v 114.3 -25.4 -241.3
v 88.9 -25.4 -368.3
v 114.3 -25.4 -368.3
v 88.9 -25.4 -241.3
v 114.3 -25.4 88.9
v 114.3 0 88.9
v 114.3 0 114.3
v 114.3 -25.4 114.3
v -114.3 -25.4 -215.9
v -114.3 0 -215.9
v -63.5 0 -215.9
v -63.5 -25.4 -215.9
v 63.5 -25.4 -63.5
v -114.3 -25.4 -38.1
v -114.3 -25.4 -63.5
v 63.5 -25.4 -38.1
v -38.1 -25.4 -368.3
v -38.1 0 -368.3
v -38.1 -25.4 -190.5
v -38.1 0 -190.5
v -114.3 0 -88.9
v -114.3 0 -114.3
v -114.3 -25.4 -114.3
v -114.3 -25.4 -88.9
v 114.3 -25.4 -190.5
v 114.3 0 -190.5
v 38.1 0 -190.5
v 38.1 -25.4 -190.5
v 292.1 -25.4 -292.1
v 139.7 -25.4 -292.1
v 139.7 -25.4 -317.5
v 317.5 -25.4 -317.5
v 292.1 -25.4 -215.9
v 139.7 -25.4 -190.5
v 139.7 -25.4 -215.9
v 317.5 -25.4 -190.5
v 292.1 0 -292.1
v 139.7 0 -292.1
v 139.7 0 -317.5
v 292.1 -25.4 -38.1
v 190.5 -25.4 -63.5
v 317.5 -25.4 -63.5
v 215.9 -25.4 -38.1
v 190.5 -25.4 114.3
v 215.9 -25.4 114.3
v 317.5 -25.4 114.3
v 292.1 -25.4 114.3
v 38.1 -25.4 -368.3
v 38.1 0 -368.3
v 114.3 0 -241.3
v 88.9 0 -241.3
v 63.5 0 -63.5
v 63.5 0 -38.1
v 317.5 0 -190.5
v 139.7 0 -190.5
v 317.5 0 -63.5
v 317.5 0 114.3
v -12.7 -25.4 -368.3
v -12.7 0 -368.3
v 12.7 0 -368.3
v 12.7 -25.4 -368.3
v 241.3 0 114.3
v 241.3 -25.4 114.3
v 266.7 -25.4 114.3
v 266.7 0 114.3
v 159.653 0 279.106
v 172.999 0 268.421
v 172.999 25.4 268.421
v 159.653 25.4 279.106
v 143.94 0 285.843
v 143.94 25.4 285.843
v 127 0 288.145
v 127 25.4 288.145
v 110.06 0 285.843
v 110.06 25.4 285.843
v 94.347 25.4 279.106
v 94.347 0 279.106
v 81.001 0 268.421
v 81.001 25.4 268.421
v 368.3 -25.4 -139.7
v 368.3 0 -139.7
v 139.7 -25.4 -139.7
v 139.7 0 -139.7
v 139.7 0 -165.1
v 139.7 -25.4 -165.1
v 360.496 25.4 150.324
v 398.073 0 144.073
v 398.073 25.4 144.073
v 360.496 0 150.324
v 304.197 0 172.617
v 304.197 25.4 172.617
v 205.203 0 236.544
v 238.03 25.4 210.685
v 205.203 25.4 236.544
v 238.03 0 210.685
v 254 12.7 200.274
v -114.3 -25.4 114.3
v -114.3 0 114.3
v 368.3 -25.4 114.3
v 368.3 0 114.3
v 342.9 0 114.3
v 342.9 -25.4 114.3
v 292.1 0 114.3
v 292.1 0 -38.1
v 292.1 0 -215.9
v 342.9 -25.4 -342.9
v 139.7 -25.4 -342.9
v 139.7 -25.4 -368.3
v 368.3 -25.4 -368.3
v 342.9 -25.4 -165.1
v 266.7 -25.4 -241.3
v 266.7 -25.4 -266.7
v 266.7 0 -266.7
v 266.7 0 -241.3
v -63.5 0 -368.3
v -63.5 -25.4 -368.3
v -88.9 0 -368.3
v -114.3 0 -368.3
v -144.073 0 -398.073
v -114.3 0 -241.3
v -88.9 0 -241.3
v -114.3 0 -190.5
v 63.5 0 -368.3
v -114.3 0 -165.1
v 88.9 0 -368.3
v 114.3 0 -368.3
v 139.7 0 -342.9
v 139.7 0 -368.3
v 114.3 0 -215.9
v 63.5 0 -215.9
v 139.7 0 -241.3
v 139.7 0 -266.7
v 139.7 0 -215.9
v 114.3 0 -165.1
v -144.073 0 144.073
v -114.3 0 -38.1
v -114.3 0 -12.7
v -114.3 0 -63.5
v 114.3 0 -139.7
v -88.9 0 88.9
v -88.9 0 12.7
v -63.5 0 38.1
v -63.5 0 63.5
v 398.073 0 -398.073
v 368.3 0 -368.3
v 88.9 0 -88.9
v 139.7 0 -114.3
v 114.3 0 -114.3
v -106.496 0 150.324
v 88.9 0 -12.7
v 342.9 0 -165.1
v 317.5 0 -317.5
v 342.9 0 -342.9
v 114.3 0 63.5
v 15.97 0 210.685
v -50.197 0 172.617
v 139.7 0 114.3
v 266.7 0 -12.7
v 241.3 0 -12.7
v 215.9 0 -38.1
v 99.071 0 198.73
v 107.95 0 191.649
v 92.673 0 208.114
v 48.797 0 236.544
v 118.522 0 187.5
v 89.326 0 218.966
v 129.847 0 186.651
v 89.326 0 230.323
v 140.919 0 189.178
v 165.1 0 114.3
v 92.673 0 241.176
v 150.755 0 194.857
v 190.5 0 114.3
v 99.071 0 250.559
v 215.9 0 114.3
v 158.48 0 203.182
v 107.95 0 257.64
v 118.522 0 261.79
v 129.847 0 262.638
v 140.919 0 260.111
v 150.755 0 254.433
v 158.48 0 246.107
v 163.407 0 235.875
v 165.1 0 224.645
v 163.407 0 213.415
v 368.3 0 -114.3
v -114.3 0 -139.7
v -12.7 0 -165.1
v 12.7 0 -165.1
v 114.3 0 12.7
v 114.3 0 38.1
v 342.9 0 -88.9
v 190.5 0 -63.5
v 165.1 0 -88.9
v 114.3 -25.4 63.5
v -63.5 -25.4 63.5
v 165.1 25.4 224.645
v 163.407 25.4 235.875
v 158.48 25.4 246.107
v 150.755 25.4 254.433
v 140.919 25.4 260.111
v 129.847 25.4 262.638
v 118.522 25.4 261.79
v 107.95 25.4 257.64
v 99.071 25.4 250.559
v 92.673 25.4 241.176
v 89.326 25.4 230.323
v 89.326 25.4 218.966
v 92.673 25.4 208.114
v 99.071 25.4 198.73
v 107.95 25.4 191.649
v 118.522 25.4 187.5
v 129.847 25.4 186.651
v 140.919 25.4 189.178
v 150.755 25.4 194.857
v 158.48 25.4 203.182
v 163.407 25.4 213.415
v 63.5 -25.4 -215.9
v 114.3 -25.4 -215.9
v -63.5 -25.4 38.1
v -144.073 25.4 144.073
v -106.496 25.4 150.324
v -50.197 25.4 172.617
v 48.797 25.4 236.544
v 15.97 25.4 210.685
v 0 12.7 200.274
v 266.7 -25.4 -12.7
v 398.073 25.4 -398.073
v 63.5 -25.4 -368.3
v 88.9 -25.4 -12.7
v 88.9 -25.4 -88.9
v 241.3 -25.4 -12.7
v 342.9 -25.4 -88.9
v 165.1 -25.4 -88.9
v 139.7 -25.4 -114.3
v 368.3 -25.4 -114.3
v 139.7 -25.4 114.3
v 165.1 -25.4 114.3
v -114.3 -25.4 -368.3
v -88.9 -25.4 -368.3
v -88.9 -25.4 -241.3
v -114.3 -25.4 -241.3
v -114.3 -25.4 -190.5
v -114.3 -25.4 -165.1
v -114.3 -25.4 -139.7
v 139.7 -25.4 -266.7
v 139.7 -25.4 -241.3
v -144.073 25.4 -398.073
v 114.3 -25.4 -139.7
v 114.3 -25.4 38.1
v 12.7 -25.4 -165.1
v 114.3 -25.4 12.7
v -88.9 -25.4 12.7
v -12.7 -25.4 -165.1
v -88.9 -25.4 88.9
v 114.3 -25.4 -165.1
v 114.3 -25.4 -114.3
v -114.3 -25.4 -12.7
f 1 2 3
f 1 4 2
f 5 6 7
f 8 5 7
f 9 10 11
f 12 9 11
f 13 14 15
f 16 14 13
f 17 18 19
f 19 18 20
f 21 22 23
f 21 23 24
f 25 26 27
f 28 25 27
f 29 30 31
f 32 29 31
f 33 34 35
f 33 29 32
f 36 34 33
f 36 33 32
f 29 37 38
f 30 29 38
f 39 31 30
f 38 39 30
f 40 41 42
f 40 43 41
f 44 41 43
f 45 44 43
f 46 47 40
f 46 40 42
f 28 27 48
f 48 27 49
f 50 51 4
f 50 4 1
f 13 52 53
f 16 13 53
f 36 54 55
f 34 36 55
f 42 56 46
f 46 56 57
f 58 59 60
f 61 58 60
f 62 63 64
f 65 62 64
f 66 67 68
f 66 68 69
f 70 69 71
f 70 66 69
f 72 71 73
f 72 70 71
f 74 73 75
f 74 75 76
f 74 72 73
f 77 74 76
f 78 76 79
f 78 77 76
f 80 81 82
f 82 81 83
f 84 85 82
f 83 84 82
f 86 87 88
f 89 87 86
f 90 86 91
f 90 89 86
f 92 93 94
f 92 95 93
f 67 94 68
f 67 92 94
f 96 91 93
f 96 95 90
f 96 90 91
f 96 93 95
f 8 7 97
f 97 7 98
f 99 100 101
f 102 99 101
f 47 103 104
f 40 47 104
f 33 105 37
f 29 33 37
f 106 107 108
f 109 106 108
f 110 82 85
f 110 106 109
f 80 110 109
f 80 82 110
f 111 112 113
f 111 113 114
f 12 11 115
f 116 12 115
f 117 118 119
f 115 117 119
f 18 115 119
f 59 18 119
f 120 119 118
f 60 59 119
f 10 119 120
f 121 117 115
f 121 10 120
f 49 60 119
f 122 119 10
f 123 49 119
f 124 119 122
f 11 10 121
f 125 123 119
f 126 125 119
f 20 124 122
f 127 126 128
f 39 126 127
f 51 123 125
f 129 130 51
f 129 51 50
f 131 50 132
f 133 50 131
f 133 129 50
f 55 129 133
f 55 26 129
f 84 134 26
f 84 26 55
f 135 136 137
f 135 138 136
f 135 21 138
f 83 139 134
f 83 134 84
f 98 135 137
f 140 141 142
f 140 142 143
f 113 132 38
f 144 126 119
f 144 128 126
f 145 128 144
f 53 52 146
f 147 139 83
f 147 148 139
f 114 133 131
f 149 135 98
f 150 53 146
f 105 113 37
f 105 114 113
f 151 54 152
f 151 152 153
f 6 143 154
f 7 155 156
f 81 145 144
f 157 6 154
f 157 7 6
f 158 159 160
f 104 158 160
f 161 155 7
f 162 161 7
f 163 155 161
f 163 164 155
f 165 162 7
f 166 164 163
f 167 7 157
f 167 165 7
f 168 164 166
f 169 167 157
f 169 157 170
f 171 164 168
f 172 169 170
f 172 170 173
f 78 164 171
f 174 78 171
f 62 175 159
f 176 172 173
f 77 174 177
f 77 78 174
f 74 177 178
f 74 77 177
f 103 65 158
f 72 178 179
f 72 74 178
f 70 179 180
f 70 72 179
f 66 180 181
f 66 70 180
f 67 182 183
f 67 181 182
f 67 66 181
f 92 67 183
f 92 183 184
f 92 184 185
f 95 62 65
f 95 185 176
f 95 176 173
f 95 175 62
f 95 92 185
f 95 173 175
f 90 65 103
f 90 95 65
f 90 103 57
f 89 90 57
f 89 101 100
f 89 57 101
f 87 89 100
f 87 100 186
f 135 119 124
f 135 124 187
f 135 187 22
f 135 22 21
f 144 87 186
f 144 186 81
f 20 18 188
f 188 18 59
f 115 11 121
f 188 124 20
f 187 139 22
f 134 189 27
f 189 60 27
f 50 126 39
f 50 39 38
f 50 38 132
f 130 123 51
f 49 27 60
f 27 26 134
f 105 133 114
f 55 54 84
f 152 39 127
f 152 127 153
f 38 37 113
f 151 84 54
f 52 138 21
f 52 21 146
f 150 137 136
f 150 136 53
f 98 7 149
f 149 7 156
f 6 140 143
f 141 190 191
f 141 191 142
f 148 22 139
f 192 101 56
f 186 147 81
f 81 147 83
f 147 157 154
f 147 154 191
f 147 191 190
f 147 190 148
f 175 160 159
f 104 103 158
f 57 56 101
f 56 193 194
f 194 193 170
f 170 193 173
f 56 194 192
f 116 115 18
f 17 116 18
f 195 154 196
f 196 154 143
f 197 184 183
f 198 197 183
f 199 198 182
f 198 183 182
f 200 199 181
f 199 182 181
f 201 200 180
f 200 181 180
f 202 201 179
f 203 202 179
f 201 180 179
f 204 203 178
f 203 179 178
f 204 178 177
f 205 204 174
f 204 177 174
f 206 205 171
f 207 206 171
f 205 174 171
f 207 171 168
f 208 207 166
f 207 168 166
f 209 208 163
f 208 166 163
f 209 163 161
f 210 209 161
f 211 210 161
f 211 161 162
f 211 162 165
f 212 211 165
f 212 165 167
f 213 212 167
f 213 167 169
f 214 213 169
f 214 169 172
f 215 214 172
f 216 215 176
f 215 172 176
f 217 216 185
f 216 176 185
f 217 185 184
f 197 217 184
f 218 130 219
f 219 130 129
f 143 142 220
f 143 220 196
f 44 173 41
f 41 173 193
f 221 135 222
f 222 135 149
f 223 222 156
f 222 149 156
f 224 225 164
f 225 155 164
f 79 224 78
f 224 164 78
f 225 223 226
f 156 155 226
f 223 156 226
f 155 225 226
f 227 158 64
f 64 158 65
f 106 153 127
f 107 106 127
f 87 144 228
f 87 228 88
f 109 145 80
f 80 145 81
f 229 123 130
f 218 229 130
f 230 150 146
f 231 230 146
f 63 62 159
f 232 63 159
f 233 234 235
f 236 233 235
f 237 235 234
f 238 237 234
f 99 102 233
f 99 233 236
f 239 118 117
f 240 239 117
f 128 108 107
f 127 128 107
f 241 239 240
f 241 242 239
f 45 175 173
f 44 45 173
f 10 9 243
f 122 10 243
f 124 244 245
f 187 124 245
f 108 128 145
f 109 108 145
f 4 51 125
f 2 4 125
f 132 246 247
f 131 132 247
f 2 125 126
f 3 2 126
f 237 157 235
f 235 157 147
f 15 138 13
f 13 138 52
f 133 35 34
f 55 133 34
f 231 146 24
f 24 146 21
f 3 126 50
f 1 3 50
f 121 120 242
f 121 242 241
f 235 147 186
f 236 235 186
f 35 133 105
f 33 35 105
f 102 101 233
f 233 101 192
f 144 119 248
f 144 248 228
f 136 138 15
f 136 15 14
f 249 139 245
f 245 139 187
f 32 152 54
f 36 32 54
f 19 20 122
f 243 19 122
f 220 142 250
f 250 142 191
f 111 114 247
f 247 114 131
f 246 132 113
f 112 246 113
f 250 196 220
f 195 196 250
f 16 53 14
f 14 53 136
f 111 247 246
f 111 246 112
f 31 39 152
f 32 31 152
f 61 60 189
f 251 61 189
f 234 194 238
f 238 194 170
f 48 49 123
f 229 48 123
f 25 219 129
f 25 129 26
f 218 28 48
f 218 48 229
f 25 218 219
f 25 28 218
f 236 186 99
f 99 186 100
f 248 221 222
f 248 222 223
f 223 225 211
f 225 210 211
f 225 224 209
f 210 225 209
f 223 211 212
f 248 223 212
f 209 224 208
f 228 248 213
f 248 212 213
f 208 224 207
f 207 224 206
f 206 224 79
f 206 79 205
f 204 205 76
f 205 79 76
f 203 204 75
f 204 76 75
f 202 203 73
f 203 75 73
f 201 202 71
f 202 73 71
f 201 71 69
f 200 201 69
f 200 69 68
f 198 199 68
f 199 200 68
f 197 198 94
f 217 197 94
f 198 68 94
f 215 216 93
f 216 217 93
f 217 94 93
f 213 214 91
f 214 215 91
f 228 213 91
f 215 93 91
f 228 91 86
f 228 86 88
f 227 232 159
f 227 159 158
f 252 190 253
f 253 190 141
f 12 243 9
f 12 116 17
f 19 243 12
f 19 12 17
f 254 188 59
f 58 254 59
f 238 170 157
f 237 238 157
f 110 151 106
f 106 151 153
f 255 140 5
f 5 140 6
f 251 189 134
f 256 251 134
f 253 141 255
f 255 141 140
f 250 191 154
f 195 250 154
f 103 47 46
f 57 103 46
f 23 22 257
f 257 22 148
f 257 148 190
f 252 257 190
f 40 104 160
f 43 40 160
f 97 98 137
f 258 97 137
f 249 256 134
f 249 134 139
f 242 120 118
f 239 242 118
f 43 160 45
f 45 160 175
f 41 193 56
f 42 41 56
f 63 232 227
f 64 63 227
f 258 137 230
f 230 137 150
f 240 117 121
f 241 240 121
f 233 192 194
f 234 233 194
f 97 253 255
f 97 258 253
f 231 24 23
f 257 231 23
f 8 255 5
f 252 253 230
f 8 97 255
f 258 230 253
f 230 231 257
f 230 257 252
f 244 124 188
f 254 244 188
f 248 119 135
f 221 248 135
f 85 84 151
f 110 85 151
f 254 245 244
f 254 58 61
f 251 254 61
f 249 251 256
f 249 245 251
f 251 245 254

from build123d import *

# Parameters (mm, degrees)
F0_W     = 25.4
F0_H     = 25.4
F1_DEPTH = 25.4
F2_DEPTH = 25.4
F3_DEPTH = 25.4
F4_W     = 542.145707978
F4_H     = 542.145707978
F4_R     = 38.1
F5_DEPTH = 25.4


with BuildPart() as f1:
    # F0 (on Front) → F1 (new body)
    with BuildSketch(Plane.XZ):
        with Locations((101.6, 101.6)):
            Rectangle(F0_W, F0_H)
        with Locations((76.2, 101.6)):
            Rectangle(F0_W, F0_H)
        with Locations((50.8, 101.6)):
            Rectangle(F0_W, F0_H)
        with Locations((25.4, 101.6)):
            Rectangle(F0_W, F0_H)
        with Locations((0, 101.6)):
            Rectangle(F0_W, F0_H)
        with Locations((-25.4, 101.6)):
            Rectangle(F0_W, F0_H)
        with Locations((-50.8, 101.6)):
            Rectangle(F0_W, F0_H)
        with Locations((-76.2, 101.6)):
            Rectangle(F0_W, F0_H)
        with Locations((-101.6, 101.6)):
            Rectangle(F0_W, F0_H)
        with Locations((-101.6, 76.2)):
            Rectangle(F0_W, F0_H)
        with Locations((-101.6, 50.8)):
            Rectangle(F0_W, F0_H)
        with Locations((-101.6, 25.4)):
            Rectangle(F0_W, F0_H)
        with Locations((-101.6, 0)):
            Rectangle(F0_W, F0_H)
        with Locations((-76.2, 0)):
            Rectangle(F0_W, F0_H)
        with Locations((-50.8, 0)):
            Rectangle(F0_W, F0_H)
        with Locations((-25.4, 0)):
            Rectangle(F0_W, F0_H)
        Rectangle(F0_W, F0_H)
        with Locations((25.4, 0)):
            Rectangle(F0_W, F0_H)
        with Locations((50.8, 0)):
            Rectangle(F0_W, F0_H)
        with Locations((76.2, 0)):
            Rectangle(F0_W, F0_H)
        with Locations((101.6, 0)):
            Rectangle(F0_W, F0_H)
    extrude(amount=F1_DEPTH)

    # F0 (on Front) → F2, piece 4 (join)
    with BuildSketch(Plane.XZ):
        with Locations((101.6, -76.2)):
            Rectangle(F0_W, F0_H)
        with Locations((101.6, -25.4)):
            Rectangle(F0_W, F0_H)
        with Locations((101.6, -50.8)):
            Rectangle(F0_W, F0_H)
        with Locations((101.6, -101.6)):
            Rectangle(F0_W, F0_H)
        with Locations((25.4, -101.6)):
            Rectangle(F0_W, F0_H)
        with Locations((50.8, -101.6)):
            Rectangle(F0_W, F0_H)
        with Locations((76.2, -101.6)):
            Rectangle(F0_W, F0_H)
        with Locations((-76.2, -101.6)):
            Rectangle(F0_W, F0_H)
        with Locations((-50.8, -101.6)):
            Rectangle(F0_W, F0_H)
        with Locations((-25.4, -101.6)):
            Rectangle(F0_W, F0_H)
        with Locations((0, -101.6)):
            Rectangle(F0_W, F0_H)
        with Locations((-101.6, -101.6)):
            Rectangle(F0_W, F0_H)
    extrude(amount=F2_DEPTH)



with BuildPart() as f2:
    # F0 (on Front) → F2 (new body)
    with BuildSketch(Plane.XZ):
        Polygon((165.1, 88.9), (165.1, 114.3), (139.7, 114.3), (139.7, -114.3), (368.3, -114.3), (368.3, 114.3), (342.9, 114.3), (342.9, 88.9), (342.9, 63.5), (342.9, 38.1), (342.9, 12.7), (342.9, -12.7), (342.9, -38.1), (342.9, -63.5), (342.9, -88.9), (317.5, -88.9), (292.1, -88.9), (266.7, -88.9), (241.3, -88.9), (215.9, -88.9), (190.5, -88.9), (165.1, -88.9), (165.1, -63.5), (165.1, -38.1), (165.1, -12.7), (165.1, 12.7), (165.1, 38.1), (165.1, 63.5), align=None)
    extrude(amount=F2_DEPTH)


with BuildPart() as f2b:
    # F0 (on Front) → F2, piece 2 (new body)
    with BuildSketch(Plane.XZ):
        Polygon((215.9, 88.9), (215.9, 114.3), (190.5, 114.3), (190.5, 88.9), (190.5, 63.5), (215.9, 63.5), align=None)
        with Locations((203.2, 50.8)):
            Rectangle(F0_W, F0_H)
        with Locations((203.2, 25.4)):
            Rectangle(F0_W, F0_H)
        with Locations((203.2, 0)):
            Rectangle(F0_W, F0_H)
        with Locations((203.2, -25.4)):
            Rectangle(F0_W, F0_H)
        with Locations((203.2, -50.8)):
            Rectangle(F0_W, F0_H)
        with Locations((279.4, -50.8)):
            Rectangle(F0_W, F0_H)
        with Locations((304.8, -50.8)):
            Rectangle(F0_W, F0_H)
        with Locations((228.6, -50.8)):
            Rectangle(F0_W, F0_H)
        with Locations((254, -50.8)):
            Rectangle(F0_W, F0_H)
        with Locations((304.8, 76.2)):
            Rectangle(F0_W, F0_H)
        with Locations((304.8, 101.6)):
            Rectangle(F0_W, F0_H)
        with Locations((304.8, 25.4)):
            Rectangle(F0_W, F0_H)
        with Locations((304.8, 0)):
            Rectangle(F0_W, F0_H)
        with Locations((304.8, -25.4)):
            Rectangle(F0_W, F0_H)
        with Locations((304.8, 50.8)):
            Rectangle(F0_W, F0_H)
    extrude(amount=F2_DEPTH)


with BuildPart() as f2c:
    # F0 (on Front) → F2, piece 3 (new body)
    with BuildSketch(Plane.XZ):
        with Locations((254, 76.2)):
            Rectangle(F0_W, F0_H)
        with Locations((254, 25.4)):
            Rectangle(F0_W, F0_H)
        with Locations((254, 50.8)):
            Rectangle(F0_W, F0_H)
        with Locations((254, 0)):
            Rectangle(F0_W, F0_H)
        with Locations((254, 101.6)):
            Rectangle(F0_W, F0_H)
    extrude(amount=F2_DEPTH)


with BuildPart() as f2d:
    # F0 (on Front) → F2, piece 5 (new body)
    with BuildSketch(Plane.XZ):
        with Locations((-25.4, -50.8)):
            Rectangle(F0_W, F0_H)
        with Locations((-101.6, -50.8)):
            Rectangle(F0_W, F0_H)
        with Locations((-76.2, -50.8)):
            Rectangle(F0_W, F0_H)
        with Locations((50.8, -50.8)):
            Rectangle(F0_W, F0_H)
        with Locations((25.4, -50.8)):
            Rectangle(F0_W, F0_H)
        with Locations((-50.8, -50.8)):
            Rectangle(F0_W, F0_H)
        with Locations((0, -50.8)):
            Rectangle(F0_W, F0_H)
    extrude(amount=F2_DEPTH)


with BuildPart() as f2e:
    # F0 (on Front) → F2, piece 6 (new body)
    with BuildSketch(Plane.XZ):
        with Locations((-101.6, -152.4)):
            Rectangle(F0_W, F0_H)
        with Locations((101.6, -152.4)):
            Rectangle(F0_W, F0_H)
        with Locations((25.4, -152.4)):
            Rectangle(F0_W, F0_H)
        with Locations((50.8, -152.4)):
            Rectangle(F0_W, F0_H)
        with Locations((-25.4, -152.4)):
            Rectangle(F0_W, F0_H)
        with Locations((76.2, -152.4)):
            Rectangle(F0_W, F0_H)
        with Locations((0, -152.4)):
            Rectangle(F0_W, F0_H)
        with Locations((-76.2, -152.4)):
            Rectangle(F0_W, F0_H)
        with Locations((-50.8, -152.4)):
            Rectangle(F0_W, F0_H)
        with Locations((0, -355.6)):
            Rectangle(F0_W, F0_H)
        with Locations((0, -203.2)):
            Rectangle(F0_W, F0_H)
        with Locations((0, -228.6)):
            Rectangle(F0_W, F0_H)
        with Locations((0, -254)):
            Rectangle(F0_W, F0_H)
        with Locations((0, -279.4)):
            Rectangle(F0_W, F0_H)
        with Locations((0, -304.8)):
            Rectangle(F0_W, F0_H)
        with Locations((0, -177.8)):
            Rectangle(F0_W, F0_H)
        with Locations((0, -330.2)):
            Rectangle(F0_W, F0_H)
    extrude(amount=F2_DEPTH)


with BuildPart() as f2f:
    # F0 (on Front) → F2, piece 7 (new body)
    with BuildSketch(Plane.XZ):
        with Locations((76.2, -203.2)):
            Rectangle(F0_W, F0_H)
        with Locations((101.6, -203.2)):
            Rectangle(F0_W, F0_H)
        with Locations((50.8, -203.2)):
            Rectangle(F0_W, F0_H)
        with Locations((50.8, -228.6)):
            Rectangle(F0_W, F0_H)
        with Locations((50.8, -355.6)):
            Rectangle(F0_W, F0_H)
        with Locations((50.8, -254)):
            Rectangle(F0_W, F0_H)
        with Locations((50.8, -279.4)):
            Rectangle(F0_W, F0_H)
        with Locations((50.8, -304.8)):
            Rectangle(F0_W, F0_H)
        with Locations((50.8, -330.2)):
            Rectangle(F0_W, F0_H)
    extrude(amount=F2_DEPTH)


with BuildPart() as f2g:
    # F0 (on Front) → F2, piece 8 (new body)
    with BuildSketch(Plane.XZ):
        with Locations((101.6, -355.6)):
            Rectangle(F0_W, F0_H)
        with Locations((101.6, -254)):
            Rectangle(F0_W, F0_H)
        with Locations((101.6, -279.4)):
            Rectangle(F0_W, F0_H)
        with Locations((101.6, -304.8)):
            Rectangle(F0_W, F0_H)
        with Locations((101.6, -330.2)):
            Rectangle(F0_W, F0_H)
    extrude(amount=F2_DEPTH)


with BuildPart() as f2h:
    # F0 (on Front) → F2, piece 9 (new body)
    with BuildSketch(Plane.XZ):
        with Locations((-76.2, -203.2)):
            Rectangle(F0_W, F0_H)
        with Locations((-50.8, -203.2)):
            Rectangle(F0_W, F0_H)
        with Locations((-101.6, -203.2)):
            Rectangle(F0_W, F0_H)
        with Locations((-50.8, -228.6)):
            Rectangle(F0_W, F0_H)
        with Locations((-50.8, -254)):
            Rectangle(F0_W, F0_H)
        with Locations((-50.8, -279.4)):
            Rectangle(F0_W, F0_H)
        with Locations((-50.8, -304.8)):
            Rectangle(F0_W, F0_H)
        with Locations((-50.8, -330.2)):
            Rectangle(F0_W, F0_H)
        with Locations((-50.8, -355.6)):
            Rectangle(F0_W, F0_H)
    extrude(amount=F2_DEPTH)


with BuildPart() as f2i:
    # F0 (on Front) → F2, piece 10 (new body)
    with BuildSketch(Plane.XZ):
        with Locations((-101.6, -355.6)):
            Rectangle(F0_W, F0_H)
        with Locations((-101.6, -254)):
            Rectangle(F0_W, F0_H)
        with Locations((-101.6, -279.4)):
            Rectangle(F0_W, F0_H)
        with Locations((-101.6, -304.8)):
            Rectangle(F0_W, F0_H)
        with Locations((-101.6, -330.2)):
            Rectangle(F0_W, F0_H)
    extrude(amount=F2_DEPTH)


with BuildPart() as f2j:
    # F0 (on Front) → F2, piece 11 (new body)
    with BuildSketch(Plane.XZ):
        with Locations((152.4, -152.4)):
            Rectangle(F0_W, F0_H)
        with Locations((355.6, -152.4)):
            Rectangle(F0_W, F0_H)
        with Locations((203.2, -152.4)):
            Rectangle(F0_W, F0_H)
        with Locations((279.4, -152.4)):
            Rectangle(F0_W, F0_H)
        with Locations((304.8, -152.4)):
            Rectangle(F0_W, F0_H)
        with Locations((228.6, -152.4)):
            Rectangle(F0_W, F0_H)
        with Locations((254, -152.4)):
            Rectangle(F0_W, F0_H)
        with Locations((330.2, -152.4)):
            Rectangle(F0_W, F0_H)
        with Locations((177.8, -152.4)):
            Rectangle(F0_W, F0_H)
        with Locations((355.6, -355.6)):
            Rectangle(F0_W, F0_H)
        with Locations((355.6, -330.2)):
            Rectangle(F0_W, F0_H)
        with Locations((355.6, -203.2)):
            Rectangle(F0_W, F0_H)
        with Locations((355.6, -177.8)):
            Rectangle(F0_W, F0_H)
        with Locations((355.6, -228.6)):
            Rectangle(F0_W, F0_H)
        with Locations((355.6, -254)):
            Rectangle(F0_W, F0_H)
        with Locations((355.6, -279.4)):
            Rectangle(F0_W, F0_H)
        with Locations((355.6, -304.8)):
            Rectangle(F0_W, F0_H)
        with Locations((152.4, -355.6)):
            Rectangle(F0_W, F0_H)
        with Locations((177.8, -355.6)):
            Rectangle(F0_W, F0_H)
        with Locations((203.2, -355.6)):
            Rectangle(F0_W, F0_H)
        with Locations((254, -355.6)):
            Rectangle(F0_W, F0_H)
        with Locations((228.6, -355.6)):
            Rectangle(F0_W, F0_H)
        with Locations((279.4, -355.6)):
            Rectangle(F0_W, F0_H)
        with Locations((304.8, -355.6)):
            Rectangle(F0_W, F0_H)
        with Locations((330.2, -355.6)):
            Rectangle(F0_W, F0_H)
    extrude(amount=F2_DEPTH)


with BuildPart() as f2k:
    # F0 (on Front) → F2, piece 12 (new body)
    with BuildSketch(Plane.XZ):
        with Locations((304.8, -203.2)):
            Rectangle(F0_W, F0_H)
        with Locations((304.8, -228.6)):
            Rectangle(F0_W, F0_H)
        with Locations((304.8, -254)):
            Rectangle(F0_W, F0_H)
        with Locations((304.8, -279.4)):
            Rectangle(F0_W, F0_H)
        with Locations((304.8, -304.8)):
            Rectangle(F0_W, F0_H)
        with Locations((279.4, -203.2)):
            Rectangle(F0_W, F0_H)
        with Locations((177.8, -203.2)):
            Rectangle(F0_W, F0_H)
        with Locations((254, -203.2)):
            Rectangle(F0_W, F0_H)
        with Locations((228.6, -203.2)):
            Rectangle(F0_W, F0_H)
        with Locations((203.2, -203.2)):
            Rectangle(F0_W, F0_H)
        with Locations((152.4, -203.2)):
            Rectangle(F0_W, F0_H)
        with Locations((177.8, -304.8)):
            Rectangle(F0_W, F0_H)
        with Locations((279.4, -304.8)):
            Rectangle(F0_W, F0_H)
        with Locations((203.2, -304.8)):
            Rectangle(F0_W, F0_H)
        with Locations((228.6, -304.8)):
            Rectangle(F0_W, F0_H)
        with Locations((254, -304.8)):
            Rectangle(F0_W, F0_H)
        with Locations((152.4, -304.8)):
            Rectangle(F0_W, F0_H)
    extrude(amount=F2_DEPTH)


with BuildPart() as f2l:
    # F0 (on Front) → F2, piece 13 (new body)
    with BuildSketch(Plane.XZ):
        with Locations((177.8, -254)):
            Rectangle(F0_W, F0_H)
        with Locations((254, -254)):
            Rectangle(F0_W, F0_H)
        with Locations((228.6, -254)):
            Rectangle(F0_W, F0_H)
        with Locations((203.2, -254)):
            Rectangle(F0_W, F0_H)
        with Locations((152.4, -254)):
            Rectangle(F0_W, F0_H)
    extrude(amount=F2_DEPTH)


with BuildPart() as f3:
    # F0 (on Front) → F3 (new body)
    with BuildSketch(Plane.XZ):
        with Locations((101.6, 50.8)):
            Rectangle(F0_W, F0_H)
        with Locations((76.2, 50.8)):
            Rectangle(F0_W, F0_H)
        with Locations((50.8, 50.8)):
            Rectangle(F0_W, F0_H)
        with Locations((25.4, 50.8)):
            Rectangle(F0_W, F0_H)
        with Locations((0, 50.8)):
            Rectangle(F0_W, F0_H)
        with Locations((-25.4, 50.8)):
            Rectangle(F0_W, F0_H)
        with Locations((-50.8, 50.8)):
            Rectangle(F0_W, F0_H)
    extrude(amount=F3_DEPTH)


with BuildPart() as f1_1:
    add(f1.part)

    add(f2.part)  # F5 merges F2

    add(f2b.part)  # F5 merges F2b

    add(f2c.part)  # F5 merges F2c

    add(f2d.part)  # F5 merges F2d

    add(f2e.part)  # F5 merges F2e

    add(f2f.part)  # F5 merges F2f

    add(f2g.part)  # F5 merges F2g

    add(f2h.part)  # F5 merges F2h

    add(f2i.part)  # F5 merges F2i

    add(f2j.part)  # F5 merges F2j

    add(f2k.part)  # F5 merges F2k

    add(f2l.part)  # F5 merges F2l

    add(f3.part)  # F5 merges F3
    # F4 (on Front) → F5 (join)
    with BuildSketch(Plane.XZ):
        with Locations((127, -127)):
            Rectangle(F4_W, F4_H)
        with BuildLine():
            add(Edge.make_bspline(
                [(-144.072853989, 144.072853989), (-103.5956195518, 144.072853989), (11.0791075699, 200.386820712), (52.5784679405, 238.5553268185), (81.0012444854, 268.4210836887)],
                knots=[0, 0, 0, 0, 0.5472424766, 1, 1, 1, 1], degree=3))
            Line((-144.072853989, 144.072853989), (398.072853989, 144.072853989))
            add(Edge.make_bspline(
                [(398.072853989, 144.072853989), (357.5956195518, 144.072853989), (242.9208924301, 200.386820712), (201.4215320595, 238.5553268185), (172.9987555146, 268.4210836887)],
                knots=[0, 0, 0, 0, 0.5472424766, 1, 1, 1, 1], degree=3))
            ThreePointArc((172.9987555146, 268.4210836887), (185.9625770094, 248.2173203745), (190.5, 224.6447831243))
            ThreePointArc((190.5, 224.6447831243), (103.4274627498, 165.6822061149), (81.0012444854, 268.4210836887))
        make_face()
        with BuildLine():
            ThreePointArc((172.9987555146, 268.4210836887), (127, 288.1447831243), (81.0012444854, 268.4210836887))
            ThreePointArc((81.0012444854, 268.4210836887), (103.4274627498, 165.6822061149), (190.5, 224.6447831243))
            ThreePointArc((190.5, 224.6447831243), (185.9625770094, 248.2173203745), (172.9987555146, 268.4210836887))
        make_face()
        with Locations((127, 224.6447831243)):
            Circle(F4_R, mode=Mode.SUBTRACT)
    extrude(amount=-F5_DEPTH)


solid = f1_1.part
